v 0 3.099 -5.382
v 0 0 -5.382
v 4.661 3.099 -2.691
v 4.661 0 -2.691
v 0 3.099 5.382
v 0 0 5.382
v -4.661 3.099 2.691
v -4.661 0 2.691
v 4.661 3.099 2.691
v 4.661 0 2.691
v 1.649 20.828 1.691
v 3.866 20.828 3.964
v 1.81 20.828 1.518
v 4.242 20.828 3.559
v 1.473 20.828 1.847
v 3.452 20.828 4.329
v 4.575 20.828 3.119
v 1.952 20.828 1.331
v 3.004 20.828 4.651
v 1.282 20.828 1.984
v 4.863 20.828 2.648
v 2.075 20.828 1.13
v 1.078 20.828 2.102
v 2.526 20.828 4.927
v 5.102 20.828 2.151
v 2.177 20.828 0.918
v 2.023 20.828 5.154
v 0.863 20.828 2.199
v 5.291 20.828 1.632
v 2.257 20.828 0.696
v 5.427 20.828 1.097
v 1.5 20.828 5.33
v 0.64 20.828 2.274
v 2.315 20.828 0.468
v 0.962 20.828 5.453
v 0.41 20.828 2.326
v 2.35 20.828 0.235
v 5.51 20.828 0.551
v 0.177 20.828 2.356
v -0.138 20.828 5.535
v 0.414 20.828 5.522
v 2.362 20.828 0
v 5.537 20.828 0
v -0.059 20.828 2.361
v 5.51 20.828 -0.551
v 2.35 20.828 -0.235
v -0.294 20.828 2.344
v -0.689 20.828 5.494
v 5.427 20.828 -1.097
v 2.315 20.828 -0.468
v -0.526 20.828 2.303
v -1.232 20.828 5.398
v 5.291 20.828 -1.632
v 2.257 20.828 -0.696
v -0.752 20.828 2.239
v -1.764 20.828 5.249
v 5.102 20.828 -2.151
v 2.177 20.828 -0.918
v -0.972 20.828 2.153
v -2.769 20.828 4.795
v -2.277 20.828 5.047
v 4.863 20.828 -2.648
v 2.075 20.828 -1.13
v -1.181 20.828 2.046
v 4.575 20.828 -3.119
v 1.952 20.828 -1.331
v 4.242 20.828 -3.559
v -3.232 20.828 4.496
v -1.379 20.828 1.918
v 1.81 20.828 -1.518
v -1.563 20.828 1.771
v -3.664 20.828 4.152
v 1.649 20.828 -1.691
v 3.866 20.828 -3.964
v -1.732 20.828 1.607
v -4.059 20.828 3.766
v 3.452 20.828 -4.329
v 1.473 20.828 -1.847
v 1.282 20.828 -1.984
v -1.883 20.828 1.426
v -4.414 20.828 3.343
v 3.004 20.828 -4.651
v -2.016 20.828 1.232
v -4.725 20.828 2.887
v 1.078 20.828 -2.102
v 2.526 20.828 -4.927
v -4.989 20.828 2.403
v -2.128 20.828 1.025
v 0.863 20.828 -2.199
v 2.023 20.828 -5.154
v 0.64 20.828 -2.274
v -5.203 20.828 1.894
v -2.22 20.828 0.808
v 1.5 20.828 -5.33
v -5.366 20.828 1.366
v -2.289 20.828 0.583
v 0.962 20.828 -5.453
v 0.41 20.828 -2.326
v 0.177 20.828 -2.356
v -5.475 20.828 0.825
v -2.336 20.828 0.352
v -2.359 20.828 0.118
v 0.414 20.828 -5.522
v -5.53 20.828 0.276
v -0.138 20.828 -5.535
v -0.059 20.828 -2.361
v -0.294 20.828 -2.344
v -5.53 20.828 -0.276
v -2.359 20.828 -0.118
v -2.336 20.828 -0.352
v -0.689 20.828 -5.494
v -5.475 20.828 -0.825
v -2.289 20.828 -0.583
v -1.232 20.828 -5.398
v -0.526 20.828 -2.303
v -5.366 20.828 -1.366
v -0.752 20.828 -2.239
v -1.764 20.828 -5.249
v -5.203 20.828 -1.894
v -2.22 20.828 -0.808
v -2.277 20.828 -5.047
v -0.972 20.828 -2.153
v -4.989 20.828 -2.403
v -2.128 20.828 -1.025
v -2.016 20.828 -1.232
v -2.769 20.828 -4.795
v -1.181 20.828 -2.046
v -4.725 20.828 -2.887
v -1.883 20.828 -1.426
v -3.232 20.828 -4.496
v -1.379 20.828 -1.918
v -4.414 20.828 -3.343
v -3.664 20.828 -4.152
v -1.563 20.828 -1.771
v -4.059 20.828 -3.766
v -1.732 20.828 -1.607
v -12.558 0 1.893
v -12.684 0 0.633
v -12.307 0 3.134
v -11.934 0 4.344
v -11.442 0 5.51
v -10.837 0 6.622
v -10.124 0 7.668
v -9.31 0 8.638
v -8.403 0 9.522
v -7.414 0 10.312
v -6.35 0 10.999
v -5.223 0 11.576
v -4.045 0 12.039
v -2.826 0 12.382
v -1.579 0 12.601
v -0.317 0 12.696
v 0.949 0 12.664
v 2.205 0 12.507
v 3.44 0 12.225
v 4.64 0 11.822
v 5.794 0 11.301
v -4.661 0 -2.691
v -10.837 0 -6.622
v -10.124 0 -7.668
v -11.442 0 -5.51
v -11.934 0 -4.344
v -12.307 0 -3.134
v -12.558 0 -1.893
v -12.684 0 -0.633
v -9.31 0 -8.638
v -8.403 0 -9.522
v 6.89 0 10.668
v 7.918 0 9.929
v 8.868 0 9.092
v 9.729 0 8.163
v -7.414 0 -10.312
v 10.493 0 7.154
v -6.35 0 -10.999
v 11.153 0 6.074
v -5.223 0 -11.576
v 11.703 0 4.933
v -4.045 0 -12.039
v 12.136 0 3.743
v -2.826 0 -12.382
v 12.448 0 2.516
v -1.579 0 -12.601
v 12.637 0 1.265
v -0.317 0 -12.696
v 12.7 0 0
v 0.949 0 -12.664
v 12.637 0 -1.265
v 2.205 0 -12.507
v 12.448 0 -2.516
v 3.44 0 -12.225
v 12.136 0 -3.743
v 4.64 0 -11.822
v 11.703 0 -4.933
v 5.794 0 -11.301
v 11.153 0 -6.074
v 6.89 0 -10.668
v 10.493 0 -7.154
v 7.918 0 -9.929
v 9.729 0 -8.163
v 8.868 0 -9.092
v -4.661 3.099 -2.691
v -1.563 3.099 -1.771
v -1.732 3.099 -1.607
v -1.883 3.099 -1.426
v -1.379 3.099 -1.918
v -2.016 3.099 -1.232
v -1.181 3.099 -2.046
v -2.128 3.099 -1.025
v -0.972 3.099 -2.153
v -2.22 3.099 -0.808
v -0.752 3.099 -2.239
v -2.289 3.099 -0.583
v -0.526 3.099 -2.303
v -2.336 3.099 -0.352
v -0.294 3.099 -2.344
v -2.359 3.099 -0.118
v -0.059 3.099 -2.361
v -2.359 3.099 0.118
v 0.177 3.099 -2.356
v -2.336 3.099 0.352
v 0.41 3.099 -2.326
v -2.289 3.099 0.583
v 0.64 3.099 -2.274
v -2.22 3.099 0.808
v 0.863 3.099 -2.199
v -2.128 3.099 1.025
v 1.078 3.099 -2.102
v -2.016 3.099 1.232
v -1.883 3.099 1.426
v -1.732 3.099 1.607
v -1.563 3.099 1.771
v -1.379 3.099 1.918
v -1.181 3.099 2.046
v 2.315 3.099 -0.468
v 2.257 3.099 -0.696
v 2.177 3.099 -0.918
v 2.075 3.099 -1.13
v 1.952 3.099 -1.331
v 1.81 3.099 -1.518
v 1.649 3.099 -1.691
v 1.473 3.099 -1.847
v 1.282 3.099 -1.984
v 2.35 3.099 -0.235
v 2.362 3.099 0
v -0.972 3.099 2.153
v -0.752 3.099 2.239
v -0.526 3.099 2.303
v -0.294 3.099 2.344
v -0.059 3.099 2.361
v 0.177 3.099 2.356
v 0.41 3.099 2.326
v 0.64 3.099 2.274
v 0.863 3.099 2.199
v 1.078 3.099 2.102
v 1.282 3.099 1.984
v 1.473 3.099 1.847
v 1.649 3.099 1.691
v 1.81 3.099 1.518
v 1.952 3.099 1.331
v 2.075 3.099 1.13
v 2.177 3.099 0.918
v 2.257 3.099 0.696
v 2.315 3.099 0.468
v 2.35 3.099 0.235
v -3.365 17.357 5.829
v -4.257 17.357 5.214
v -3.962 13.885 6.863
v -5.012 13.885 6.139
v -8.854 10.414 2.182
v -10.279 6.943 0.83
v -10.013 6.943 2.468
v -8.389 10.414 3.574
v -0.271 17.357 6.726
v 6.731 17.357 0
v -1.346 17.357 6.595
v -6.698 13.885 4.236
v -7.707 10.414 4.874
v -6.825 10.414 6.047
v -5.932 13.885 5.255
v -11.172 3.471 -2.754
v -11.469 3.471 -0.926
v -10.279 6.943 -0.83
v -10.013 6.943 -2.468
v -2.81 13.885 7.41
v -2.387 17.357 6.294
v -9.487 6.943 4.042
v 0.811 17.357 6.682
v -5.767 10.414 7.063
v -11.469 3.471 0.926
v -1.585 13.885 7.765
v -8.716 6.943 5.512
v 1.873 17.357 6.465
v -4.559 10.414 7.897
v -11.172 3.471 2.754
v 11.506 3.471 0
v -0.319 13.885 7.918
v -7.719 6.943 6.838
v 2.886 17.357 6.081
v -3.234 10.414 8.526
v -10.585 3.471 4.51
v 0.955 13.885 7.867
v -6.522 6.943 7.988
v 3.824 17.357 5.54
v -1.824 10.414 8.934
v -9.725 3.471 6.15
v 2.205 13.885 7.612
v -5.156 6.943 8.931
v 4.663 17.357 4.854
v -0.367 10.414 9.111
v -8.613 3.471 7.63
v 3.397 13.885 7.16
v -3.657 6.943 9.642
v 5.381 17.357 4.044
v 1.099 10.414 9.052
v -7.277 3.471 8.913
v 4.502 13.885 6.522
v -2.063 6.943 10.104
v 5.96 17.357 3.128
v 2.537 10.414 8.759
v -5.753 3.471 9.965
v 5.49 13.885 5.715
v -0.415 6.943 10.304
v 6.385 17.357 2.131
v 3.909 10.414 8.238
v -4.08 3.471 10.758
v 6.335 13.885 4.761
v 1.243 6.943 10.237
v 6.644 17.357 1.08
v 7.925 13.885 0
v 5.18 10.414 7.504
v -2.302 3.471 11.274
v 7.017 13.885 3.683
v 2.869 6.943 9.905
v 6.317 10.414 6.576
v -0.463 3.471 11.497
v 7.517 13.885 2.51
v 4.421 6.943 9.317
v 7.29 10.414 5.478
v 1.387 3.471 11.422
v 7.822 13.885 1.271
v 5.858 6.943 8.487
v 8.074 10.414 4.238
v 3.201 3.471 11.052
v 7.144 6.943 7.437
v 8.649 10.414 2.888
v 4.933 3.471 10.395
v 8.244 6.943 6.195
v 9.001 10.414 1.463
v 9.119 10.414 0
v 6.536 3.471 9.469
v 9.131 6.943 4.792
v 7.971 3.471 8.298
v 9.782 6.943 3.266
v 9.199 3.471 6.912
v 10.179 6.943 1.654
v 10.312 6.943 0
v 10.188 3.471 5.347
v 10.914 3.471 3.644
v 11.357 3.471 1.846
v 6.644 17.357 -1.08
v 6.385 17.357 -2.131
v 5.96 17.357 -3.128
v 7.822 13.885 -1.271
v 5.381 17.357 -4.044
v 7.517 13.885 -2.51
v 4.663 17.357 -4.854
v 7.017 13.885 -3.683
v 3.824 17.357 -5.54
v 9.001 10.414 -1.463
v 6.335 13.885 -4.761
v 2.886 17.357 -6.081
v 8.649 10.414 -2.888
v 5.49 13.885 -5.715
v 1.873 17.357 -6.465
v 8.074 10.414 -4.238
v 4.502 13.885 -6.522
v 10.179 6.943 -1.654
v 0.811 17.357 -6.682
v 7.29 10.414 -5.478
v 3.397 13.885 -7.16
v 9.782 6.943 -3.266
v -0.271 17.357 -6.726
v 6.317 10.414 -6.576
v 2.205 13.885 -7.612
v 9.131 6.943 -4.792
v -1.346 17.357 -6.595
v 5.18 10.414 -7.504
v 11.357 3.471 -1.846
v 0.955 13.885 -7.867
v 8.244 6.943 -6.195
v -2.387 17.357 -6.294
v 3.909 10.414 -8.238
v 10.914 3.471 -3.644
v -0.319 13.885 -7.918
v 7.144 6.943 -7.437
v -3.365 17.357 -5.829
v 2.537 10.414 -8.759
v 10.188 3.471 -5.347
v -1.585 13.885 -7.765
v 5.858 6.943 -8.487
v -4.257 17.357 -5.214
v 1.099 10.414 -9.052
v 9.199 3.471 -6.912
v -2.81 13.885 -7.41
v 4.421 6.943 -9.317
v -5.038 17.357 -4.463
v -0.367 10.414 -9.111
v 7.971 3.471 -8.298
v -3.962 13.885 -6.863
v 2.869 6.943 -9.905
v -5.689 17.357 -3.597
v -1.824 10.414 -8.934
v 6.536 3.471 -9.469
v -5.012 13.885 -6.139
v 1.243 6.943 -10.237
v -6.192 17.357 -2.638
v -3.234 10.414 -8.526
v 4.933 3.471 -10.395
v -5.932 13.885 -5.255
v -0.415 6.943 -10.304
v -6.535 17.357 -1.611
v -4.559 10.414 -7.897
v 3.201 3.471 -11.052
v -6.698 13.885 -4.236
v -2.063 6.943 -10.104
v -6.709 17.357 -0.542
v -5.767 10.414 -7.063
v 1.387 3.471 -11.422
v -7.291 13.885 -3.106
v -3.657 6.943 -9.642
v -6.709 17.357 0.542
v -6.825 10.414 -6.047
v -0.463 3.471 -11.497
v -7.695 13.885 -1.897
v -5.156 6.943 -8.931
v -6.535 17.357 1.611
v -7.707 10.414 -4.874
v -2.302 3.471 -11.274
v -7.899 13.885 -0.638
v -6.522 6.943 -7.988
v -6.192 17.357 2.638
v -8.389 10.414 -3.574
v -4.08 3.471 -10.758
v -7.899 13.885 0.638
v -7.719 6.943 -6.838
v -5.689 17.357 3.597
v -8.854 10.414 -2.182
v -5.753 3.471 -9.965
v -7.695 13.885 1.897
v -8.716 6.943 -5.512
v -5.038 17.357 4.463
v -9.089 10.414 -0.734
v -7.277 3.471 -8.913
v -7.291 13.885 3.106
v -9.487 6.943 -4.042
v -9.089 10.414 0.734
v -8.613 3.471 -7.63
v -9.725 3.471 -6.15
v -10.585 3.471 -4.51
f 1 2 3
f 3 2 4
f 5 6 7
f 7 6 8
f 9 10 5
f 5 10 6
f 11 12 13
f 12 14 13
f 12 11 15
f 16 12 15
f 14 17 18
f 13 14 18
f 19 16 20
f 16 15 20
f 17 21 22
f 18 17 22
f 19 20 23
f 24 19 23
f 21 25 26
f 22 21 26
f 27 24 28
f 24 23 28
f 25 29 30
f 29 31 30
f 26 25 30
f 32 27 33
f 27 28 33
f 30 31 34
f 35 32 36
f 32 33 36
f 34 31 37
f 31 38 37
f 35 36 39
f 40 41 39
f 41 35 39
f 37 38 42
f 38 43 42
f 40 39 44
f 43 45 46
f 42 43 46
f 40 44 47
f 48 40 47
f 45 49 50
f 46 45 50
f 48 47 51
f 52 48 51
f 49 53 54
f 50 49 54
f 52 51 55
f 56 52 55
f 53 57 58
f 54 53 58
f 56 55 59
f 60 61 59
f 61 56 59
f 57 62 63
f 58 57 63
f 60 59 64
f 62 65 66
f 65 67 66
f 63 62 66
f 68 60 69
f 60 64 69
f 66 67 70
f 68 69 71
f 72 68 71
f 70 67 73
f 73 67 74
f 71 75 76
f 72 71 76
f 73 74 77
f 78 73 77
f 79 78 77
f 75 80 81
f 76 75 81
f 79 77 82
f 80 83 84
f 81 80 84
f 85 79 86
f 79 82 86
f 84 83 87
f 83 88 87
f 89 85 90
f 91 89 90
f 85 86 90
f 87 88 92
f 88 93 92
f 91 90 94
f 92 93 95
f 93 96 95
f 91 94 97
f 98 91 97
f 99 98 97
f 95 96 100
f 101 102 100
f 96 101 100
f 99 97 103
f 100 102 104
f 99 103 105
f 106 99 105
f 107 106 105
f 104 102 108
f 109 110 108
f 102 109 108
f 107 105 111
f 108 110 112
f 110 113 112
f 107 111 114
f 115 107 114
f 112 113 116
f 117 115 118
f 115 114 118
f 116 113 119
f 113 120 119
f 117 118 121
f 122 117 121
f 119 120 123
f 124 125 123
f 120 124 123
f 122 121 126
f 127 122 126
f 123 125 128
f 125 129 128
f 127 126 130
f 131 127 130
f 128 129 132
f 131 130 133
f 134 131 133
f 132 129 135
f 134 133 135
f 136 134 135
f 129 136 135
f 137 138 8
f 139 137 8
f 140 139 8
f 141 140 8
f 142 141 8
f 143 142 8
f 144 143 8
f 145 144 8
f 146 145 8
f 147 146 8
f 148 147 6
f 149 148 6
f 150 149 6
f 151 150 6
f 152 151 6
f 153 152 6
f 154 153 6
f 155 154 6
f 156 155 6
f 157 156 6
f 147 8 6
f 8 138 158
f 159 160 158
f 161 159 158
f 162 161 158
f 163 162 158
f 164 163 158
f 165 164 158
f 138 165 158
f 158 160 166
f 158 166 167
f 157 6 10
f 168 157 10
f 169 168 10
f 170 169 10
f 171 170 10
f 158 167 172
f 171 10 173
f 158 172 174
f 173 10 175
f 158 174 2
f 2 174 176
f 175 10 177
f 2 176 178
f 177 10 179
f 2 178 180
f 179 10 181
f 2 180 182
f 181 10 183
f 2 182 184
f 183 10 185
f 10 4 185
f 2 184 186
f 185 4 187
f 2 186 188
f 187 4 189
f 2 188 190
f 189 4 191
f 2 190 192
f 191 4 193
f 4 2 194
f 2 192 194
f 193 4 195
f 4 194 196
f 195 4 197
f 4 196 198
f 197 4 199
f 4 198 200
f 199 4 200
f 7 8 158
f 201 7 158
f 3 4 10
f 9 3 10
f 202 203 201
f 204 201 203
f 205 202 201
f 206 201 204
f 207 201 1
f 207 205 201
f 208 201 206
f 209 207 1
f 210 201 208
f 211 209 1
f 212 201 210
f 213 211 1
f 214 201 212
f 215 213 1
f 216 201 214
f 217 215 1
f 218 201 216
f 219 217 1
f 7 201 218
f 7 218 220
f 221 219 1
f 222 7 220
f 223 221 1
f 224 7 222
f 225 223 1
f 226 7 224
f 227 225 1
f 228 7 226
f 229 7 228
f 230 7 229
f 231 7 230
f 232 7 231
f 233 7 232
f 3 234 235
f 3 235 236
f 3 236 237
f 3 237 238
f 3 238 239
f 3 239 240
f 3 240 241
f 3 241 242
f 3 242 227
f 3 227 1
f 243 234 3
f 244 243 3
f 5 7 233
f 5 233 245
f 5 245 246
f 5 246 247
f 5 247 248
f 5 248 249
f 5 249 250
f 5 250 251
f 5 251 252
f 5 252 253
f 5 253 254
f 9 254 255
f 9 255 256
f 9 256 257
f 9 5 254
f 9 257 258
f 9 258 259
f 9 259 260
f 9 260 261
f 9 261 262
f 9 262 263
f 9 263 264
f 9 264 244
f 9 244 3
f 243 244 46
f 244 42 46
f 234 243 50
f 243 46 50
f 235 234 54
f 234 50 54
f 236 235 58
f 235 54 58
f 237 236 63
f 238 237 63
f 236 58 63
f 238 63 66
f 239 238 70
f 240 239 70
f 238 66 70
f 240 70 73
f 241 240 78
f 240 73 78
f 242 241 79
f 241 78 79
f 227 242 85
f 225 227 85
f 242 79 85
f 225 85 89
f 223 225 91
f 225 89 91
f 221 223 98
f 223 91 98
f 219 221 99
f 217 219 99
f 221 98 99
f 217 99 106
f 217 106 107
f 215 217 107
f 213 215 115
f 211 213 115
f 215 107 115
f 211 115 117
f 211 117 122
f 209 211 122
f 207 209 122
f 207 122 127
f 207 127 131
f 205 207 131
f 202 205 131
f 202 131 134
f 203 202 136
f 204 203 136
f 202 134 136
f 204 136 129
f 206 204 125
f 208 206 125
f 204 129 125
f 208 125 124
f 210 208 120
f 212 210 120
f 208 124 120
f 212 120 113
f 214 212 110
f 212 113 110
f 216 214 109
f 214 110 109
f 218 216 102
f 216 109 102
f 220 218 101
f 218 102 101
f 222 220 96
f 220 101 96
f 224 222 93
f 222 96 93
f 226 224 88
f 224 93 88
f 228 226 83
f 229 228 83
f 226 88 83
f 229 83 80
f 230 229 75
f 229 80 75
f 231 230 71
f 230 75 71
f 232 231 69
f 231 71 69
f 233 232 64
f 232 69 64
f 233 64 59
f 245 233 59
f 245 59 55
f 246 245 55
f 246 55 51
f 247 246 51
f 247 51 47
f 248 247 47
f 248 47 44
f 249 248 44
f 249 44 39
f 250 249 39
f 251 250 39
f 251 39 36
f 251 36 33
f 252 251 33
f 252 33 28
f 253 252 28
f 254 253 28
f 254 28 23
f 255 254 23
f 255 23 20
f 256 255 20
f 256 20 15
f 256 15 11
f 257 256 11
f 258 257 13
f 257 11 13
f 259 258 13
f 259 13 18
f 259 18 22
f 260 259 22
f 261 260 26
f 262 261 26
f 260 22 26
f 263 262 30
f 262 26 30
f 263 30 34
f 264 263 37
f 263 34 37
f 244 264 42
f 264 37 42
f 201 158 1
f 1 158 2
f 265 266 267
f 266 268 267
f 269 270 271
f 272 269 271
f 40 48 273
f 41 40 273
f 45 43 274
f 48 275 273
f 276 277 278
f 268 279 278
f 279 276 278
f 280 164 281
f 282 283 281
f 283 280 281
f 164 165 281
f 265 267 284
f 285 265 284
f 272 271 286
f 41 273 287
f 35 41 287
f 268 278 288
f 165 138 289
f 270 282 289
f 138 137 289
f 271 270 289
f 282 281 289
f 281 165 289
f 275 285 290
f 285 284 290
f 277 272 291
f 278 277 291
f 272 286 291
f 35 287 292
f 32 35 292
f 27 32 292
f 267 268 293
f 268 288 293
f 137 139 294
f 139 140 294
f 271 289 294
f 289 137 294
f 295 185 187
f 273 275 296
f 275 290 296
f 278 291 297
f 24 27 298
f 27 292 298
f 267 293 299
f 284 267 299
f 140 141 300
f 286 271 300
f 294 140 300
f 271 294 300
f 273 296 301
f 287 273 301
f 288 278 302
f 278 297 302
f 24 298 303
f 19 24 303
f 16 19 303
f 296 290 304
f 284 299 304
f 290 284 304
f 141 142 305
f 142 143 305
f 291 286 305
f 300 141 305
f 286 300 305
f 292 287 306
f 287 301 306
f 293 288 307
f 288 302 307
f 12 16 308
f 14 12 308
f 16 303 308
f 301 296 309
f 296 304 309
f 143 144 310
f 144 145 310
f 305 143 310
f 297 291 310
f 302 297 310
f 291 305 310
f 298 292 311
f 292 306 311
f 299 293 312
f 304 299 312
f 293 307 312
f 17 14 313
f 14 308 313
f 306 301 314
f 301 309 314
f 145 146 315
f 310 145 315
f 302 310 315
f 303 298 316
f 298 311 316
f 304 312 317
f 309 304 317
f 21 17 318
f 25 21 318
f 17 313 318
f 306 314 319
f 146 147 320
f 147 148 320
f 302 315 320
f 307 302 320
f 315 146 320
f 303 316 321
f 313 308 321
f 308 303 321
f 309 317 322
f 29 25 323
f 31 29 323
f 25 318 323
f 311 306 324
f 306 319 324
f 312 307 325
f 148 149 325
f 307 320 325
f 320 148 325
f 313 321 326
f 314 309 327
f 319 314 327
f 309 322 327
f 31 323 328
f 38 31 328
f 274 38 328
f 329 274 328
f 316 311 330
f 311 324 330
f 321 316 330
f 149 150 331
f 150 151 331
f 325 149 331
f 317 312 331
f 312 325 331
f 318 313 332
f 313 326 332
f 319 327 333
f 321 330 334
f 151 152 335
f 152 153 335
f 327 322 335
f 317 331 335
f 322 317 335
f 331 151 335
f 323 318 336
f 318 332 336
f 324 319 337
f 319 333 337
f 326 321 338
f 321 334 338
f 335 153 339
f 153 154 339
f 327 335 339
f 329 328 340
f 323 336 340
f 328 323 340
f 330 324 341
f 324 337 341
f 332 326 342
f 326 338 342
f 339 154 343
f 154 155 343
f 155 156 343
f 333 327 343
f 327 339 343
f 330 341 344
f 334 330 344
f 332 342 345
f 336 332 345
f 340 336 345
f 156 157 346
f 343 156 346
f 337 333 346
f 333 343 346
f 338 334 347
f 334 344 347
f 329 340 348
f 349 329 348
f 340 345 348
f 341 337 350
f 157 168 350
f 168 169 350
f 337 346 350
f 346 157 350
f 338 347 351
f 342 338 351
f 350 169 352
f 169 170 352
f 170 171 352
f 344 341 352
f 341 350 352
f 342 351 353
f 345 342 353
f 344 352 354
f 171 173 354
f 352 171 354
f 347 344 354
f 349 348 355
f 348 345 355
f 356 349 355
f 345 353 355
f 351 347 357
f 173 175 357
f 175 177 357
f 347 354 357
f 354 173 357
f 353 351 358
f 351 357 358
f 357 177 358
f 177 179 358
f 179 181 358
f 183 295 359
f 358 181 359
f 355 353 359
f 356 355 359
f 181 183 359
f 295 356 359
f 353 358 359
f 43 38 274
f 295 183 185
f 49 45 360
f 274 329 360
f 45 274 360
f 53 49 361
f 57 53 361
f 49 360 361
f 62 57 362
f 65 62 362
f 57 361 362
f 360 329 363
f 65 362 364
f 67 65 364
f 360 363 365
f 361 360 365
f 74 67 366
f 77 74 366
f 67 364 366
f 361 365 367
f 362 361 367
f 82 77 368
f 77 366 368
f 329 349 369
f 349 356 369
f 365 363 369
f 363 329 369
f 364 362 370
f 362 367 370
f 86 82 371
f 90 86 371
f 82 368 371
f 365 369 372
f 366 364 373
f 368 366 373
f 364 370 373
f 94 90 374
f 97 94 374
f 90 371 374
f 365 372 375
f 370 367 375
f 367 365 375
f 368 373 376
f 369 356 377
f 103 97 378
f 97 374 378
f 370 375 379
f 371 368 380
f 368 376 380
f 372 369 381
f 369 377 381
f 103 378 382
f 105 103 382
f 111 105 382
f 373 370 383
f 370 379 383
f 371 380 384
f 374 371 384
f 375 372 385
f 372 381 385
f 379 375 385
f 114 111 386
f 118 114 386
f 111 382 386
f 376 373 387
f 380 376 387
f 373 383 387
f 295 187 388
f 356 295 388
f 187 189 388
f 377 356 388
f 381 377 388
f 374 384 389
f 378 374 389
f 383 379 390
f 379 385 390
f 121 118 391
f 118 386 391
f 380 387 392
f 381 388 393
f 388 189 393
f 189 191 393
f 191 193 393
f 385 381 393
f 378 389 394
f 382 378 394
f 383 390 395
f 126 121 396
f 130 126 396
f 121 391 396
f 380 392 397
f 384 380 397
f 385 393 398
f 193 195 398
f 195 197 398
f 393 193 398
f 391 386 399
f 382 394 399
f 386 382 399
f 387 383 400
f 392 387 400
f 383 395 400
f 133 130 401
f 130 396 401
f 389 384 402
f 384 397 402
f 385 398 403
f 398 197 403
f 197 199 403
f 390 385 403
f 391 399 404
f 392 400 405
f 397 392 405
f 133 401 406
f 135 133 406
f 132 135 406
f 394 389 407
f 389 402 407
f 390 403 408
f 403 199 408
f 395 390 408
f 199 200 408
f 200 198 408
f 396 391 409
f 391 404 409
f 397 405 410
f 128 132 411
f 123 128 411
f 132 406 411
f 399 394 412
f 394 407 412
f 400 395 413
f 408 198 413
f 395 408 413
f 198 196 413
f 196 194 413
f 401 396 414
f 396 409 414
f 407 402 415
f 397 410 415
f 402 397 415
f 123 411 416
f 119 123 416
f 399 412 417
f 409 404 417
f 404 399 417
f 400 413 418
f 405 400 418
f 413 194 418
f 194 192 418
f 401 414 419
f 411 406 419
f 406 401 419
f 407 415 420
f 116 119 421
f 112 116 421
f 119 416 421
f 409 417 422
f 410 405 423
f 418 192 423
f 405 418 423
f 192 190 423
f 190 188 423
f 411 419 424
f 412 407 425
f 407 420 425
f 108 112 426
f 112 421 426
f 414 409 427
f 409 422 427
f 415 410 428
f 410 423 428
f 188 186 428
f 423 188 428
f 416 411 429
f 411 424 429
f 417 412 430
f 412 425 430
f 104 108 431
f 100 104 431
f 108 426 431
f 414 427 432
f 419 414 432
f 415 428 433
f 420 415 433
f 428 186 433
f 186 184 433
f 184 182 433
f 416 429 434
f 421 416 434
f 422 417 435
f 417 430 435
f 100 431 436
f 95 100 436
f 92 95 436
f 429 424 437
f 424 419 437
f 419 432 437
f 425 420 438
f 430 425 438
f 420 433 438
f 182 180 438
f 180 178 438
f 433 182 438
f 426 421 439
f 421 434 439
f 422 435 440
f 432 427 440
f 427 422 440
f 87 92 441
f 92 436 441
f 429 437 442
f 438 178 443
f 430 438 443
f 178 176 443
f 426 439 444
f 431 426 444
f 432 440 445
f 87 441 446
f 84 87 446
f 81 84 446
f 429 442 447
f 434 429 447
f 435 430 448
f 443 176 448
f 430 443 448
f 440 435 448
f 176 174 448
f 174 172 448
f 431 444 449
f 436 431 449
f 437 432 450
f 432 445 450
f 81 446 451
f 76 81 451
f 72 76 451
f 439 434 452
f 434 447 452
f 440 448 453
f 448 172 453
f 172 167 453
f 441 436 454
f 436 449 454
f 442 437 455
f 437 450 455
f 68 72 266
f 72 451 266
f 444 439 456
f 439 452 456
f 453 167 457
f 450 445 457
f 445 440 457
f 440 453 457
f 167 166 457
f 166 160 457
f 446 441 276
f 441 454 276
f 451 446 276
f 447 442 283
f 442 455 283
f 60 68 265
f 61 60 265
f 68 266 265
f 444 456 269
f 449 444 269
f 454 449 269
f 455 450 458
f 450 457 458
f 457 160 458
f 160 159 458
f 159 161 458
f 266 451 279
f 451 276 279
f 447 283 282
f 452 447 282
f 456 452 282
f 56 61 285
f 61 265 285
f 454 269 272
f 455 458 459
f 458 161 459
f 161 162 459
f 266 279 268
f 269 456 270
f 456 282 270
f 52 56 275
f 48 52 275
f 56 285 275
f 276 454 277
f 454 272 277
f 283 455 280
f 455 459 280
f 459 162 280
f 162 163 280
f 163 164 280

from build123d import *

# Parameters (mm, degrees)
CUT_EXTRUDE1_DEPTH = 3.0988


with BuildPart() as part:
    # Sketch1 → Revolve1 (revolve)
    with BuildSketch(Plane.XY):
        Polygon((12.7, 0), (2.3622, 0), (2.3622, 20.828), (5.5372, 20.828), align=None)
    revolve(axis=Axis((0, 0, 0), (0, 1, 0)))

    # Sketch2 → Cut-Extrude1 (cut)
    with BuildSketch(Plane.XZ):
        Polygon((0, 5.381943739), (-4.6609, 2.69097187), (-4.6609, -2.69097187), (0, -5.381943739), (4.6609, -2.69097187), (4.6609, 2.69097187), align=None)
    extrude(amount=-CUT_EXTRUDE1_DEPTH, mode=Mode.SUBTRACT)


solid = part.part
